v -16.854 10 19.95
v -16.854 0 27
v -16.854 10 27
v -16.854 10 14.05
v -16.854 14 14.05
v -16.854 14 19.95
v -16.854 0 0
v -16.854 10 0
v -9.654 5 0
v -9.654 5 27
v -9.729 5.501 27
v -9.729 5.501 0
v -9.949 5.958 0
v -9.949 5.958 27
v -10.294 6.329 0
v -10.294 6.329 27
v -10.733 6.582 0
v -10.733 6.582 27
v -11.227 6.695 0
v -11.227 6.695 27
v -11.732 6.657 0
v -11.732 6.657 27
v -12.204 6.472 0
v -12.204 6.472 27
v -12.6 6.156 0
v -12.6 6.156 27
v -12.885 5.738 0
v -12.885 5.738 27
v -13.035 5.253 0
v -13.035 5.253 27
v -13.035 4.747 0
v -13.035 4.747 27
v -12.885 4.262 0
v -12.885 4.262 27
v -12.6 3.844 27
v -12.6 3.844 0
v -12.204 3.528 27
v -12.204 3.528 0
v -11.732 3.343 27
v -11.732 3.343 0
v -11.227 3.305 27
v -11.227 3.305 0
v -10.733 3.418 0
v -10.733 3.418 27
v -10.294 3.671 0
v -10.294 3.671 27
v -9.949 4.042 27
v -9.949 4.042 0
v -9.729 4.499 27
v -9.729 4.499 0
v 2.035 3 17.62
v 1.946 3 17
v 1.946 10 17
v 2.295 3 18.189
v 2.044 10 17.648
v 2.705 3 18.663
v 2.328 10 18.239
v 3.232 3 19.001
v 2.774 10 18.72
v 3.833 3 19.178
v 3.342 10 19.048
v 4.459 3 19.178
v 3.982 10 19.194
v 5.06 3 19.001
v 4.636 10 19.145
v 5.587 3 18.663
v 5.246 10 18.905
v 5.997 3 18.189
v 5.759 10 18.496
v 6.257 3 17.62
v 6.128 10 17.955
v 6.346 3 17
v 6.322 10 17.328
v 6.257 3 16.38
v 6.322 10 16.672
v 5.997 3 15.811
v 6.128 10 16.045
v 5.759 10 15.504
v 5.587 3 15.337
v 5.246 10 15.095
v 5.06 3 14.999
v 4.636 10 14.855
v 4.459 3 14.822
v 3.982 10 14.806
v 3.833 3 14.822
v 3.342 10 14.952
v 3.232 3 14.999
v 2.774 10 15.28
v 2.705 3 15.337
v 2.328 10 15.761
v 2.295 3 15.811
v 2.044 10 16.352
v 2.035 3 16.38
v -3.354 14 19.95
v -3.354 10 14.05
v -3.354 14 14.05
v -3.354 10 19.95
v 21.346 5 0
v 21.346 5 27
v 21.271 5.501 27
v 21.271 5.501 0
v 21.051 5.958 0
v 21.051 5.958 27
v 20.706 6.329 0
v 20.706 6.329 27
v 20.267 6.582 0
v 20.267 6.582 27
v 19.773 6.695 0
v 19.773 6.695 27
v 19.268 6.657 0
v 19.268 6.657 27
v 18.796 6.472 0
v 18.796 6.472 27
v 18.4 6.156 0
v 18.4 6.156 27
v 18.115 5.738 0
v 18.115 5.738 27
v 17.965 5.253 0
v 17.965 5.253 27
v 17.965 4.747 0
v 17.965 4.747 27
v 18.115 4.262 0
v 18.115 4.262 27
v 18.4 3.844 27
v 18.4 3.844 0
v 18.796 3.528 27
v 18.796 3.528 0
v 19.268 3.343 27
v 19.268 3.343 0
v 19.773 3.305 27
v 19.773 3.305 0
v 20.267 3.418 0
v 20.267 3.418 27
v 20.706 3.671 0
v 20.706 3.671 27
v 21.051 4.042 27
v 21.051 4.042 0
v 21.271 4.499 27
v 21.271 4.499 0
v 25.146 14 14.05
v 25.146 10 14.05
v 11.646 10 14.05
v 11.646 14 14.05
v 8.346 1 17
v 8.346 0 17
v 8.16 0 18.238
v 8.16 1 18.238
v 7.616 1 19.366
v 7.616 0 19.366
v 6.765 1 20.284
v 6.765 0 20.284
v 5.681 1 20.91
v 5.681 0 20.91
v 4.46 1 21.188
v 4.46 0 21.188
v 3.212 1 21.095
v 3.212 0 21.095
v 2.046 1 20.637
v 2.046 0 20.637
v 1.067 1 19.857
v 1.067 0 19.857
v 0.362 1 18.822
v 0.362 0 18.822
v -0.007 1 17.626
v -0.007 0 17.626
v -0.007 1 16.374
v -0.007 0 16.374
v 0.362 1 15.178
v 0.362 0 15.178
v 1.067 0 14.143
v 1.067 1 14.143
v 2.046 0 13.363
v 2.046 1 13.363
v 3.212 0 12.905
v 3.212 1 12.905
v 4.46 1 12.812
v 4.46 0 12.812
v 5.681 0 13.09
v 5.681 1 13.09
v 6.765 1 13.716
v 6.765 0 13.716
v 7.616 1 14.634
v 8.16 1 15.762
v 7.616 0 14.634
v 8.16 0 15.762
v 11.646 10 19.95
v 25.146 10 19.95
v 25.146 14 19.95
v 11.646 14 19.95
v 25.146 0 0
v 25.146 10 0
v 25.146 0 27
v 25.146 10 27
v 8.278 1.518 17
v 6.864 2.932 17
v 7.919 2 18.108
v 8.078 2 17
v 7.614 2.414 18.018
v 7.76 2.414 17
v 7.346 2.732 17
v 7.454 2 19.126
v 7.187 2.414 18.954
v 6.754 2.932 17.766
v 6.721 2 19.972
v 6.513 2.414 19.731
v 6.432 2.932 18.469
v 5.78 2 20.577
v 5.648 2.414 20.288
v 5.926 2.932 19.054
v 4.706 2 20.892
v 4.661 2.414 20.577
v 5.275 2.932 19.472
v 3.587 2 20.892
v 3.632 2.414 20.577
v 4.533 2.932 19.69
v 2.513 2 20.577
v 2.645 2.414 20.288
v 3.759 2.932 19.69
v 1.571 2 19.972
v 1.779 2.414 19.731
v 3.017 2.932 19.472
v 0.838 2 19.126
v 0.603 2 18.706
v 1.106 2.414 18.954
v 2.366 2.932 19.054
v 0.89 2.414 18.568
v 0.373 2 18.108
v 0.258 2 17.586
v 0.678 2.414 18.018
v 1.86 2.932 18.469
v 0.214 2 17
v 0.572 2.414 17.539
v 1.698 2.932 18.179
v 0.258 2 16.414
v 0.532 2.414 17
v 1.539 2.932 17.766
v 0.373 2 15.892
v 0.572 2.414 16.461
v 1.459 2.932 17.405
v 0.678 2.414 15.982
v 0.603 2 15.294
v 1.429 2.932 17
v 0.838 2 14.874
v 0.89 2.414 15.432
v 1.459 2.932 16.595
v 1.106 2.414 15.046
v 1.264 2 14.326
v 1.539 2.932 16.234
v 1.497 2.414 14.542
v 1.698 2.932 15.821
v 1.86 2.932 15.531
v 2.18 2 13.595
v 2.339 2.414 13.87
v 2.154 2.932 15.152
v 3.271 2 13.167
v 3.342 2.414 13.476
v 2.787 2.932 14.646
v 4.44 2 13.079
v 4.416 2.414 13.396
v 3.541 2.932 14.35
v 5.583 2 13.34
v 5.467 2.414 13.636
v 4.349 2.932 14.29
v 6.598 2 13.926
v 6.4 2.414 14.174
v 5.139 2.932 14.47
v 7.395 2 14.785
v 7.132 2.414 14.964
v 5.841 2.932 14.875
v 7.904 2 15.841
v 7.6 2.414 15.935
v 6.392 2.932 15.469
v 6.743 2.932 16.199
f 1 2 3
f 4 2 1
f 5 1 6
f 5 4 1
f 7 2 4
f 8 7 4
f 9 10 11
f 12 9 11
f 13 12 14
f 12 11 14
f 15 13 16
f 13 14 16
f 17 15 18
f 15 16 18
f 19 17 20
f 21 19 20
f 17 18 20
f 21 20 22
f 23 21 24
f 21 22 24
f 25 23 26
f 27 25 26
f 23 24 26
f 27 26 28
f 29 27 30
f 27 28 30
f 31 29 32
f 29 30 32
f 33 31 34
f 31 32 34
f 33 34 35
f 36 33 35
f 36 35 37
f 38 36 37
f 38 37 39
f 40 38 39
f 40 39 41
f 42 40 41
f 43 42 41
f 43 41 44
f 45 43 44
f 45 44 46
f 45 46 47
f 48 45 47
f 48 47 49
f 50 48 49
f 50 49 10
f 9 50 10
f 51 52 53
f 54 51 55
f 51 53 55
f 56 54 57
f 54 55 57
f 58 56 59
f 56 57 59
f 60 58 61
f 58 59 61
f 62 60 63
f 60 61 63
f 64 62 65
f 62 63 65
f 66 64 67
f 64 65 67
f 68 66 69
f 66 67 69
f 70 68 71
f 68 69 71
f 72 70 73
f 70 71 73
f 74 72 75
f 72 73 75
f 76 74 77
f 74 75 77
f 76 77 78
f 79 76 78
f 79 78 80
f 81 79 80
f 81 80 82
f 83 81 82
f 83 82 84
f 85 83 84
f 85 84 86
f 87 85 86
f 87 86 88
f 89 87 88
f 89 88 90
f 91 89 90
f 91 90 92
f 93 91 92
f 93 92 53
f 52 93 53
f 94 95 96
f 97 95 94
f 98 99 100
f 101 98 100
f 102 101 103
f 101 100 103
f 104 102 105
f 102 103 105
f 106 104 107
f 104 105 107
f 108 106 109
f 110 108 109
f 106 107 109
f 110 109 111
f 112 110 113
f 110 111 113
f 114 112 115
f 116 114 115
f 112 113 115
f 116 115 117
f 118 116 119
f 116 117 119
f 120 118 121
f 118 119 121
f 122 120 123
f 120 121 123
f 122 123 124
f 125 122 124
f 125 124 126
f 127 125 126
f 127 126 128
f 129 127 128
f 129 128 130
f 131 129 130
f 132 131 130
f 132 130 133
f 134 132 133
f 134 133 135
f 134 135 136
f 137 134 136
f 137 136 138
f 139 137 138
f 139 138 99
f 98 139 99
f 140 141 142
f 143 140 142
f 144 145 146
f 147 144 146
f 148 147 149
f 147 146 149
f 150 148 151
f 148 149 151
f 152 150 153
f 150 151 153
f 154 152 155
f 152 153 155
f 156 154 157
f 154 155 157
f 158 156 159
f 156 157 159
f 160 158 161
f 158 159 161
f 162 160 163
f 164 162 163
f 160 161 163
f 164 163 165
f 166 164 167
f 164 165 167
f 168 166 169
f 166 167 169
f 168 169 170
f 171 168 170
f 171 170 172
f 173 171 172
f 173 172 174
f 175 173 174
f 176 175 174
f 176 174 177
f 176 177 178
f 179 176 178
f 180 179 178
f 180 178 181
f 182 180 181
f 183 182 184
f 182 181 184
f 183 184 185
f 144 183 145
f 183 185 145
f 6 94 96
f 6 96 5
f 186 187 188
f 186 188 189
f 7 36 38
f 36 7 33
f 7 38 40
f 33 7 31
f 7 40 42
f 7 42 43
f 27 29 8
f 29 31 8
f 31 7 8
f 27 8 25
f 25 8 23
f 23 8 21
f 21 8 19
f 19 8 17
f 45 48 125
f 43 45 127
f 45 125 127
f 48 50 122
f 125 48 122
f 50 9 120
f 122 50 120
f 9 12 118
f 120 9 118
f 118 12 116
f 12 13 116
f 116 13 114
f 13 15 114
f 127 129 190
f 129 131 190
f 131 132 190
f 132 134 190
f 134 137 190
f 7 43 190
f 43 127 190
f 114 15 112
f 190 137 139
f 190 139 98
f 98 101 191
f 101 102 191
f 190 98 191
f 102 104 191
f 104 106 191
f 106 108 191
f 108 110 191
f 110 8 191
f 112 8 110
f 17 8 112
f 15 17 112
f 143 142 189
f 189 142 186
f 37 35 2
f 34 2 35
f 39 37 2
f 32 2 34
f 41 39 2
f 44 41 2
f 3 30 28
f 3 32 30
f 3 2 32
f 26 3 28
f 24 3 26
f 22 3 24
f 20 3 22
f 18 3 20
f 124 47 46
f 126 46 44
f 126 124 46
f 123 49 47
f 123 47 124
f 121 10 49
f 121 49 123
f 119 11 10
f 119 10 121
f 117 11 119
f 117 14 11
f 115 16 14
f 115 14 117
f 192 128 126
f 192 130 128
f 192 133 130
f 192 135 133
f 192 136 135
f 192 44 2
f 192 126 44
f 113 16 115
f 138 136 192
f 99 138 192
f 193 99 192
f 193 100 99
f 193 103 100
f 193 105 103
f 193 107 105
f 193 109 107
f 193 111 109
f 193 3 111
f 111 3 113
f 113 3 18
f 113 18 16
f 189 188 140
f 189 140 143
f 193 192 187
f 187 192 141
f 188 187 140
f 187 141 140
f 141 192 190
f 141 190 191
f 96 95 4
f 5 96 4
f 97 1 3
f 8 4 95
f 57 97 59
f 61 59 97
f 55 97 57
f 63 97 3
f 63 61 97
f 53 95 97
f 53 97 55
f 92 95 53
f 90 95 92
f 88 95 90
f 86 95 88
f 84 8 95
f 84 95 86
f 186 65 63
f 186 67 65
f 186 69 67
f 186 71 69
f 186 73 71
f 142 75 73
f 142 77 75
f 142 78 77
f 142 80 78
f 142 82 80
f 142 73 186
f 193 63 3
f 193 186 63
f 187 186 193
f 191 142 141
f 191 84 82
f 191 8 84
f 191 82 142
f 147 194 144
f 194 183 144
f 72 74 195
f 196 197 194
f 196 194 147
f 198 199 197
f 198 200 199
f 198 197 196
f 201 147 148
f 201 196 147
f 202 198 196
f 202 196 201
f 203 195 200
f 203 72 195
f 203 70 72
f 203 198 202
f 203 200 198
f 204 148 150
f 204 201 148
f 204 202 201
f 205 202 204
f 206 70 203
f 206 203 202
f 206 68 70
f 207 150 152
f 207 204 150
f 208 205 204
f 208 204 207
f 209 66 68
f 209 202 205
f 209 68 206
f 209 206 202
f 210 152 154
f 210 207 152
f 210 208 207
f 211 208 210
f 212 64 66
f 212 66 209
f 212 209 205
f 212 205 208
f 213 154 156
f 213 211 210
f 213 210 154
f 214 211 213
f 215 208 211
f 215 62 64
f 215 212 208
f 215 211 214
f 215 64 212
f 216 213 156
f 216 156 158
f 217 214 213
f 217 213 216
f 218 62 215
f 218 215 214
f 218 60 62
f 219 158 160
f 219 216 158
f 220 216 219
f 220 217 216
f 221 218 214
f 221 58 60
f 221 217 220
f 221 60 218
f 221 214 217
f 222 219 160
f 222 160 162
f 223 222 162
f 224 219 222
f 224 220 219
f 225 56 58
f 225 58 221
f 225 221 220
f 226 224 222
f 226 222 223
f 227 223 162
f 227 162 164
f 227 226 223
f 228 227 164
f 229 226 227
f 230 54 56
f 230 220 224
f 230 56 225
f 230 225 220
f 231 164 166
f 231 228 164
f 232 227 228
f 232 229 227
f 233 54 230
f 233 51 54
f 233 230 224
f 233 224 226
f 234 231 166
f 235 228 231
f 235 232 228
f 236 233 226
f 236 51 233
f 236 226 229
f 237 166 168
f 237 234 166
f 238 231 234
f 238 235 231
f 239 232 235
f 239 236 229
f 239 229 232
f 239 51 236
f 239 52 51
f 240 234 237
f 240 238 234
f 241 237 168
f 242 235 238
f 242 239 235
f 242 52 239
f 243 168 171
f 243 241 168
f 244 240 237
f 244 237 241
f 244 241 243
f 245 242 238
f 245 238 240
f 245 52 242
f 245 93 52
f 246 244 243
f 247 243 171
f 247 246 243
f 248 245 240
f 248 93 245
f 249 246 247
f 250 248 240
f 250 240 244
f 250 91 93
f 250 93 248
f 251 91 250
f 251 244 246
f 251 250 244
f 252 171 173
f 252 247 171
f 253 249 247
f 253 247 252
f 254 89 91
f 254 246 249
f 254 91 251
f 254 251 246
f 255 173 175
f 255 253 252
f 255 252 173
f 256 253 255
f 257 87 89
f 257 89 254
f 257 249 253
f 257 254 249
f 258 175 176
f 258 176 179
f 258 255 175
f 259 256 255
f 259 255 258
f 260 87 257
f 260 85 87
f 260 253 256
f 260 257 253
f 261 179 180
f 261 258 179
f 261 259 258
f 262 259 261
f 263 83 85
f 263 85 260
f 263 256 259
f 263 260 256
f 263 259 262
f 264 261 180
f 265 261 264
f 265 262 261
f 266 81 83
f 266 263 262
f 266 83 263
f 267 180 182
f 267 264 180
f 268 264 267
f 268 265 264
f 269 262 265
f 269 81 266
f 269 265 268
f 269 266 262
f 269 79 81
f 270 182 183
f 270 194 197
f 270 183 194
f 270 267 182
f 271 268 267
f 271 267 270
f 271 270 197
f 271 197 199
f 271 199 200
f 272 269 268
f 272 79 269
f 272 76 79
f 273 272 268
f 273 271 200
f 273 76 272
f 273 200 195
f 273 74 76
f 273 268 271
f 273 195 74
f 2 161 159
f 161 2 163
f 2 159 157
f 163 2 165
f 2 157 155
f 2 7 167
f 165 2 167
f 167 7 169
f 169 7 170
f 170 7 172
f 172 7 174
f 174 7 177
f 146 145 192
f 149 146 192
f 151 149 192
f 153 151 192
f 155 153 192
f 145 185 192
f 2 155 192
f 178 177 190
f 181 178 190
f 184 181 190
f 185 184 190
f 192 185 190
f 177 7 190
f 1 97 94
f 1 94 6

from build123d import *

# Parameters (mm, degrees)
F0_W     = 42
F0_H     = 10
F1_DEPTH = 27
F2_R     = 1.7
F3_DEPTH = 27.001
F4_W     = 13.5
F4_H     = 5.9
F5_DEPTH = 4
F4_R     = 2.2
F6_DEPTH = 25
F7_R     = 4.2
F8_DEPTH = 3
F9_R     = 1.99999


# Not quite as in the source:
# - a fillet or chamfer is up to 0.001 mm smaller than in the source, because OpenCascade refuses the exact size


with BuildPart() as f1:
    # F0 (on Top) → F1 (new body)
    with BuildSketch(Plane.XY):
        with Locations((4.146153807, 5)):
            Rectangle(F0_W, F0_H)
    extrude(amount=F1_DEPTH)

    # F2 (on face) → F3 (cut, through all)
    with BuildSketch(Plane.XY.offset(27)):
        with BuildLine():
            ThreePointArc((-13.053846193, 5), (-11.353846193, 3.3), (-9.653846193, 5))
            ThreePointArc((-9.653846193, 5), (-11.353846193, 6.7), (-13.053846193, 5))
        make_face()
        with Locations((19.646153807, 5)):
            Circle(F2_R)
    extrude(amount=-F3_DEPTH, mode=Mode.SUBTRACT)

    # F4 (on face) → F5 (join)
    with BuildSketch(Plane(origin=(0, 10, 0), x_dir=(-1, 0, 0), z_dir=(0, 1, 0))):
        with Locations((-18.396153807, 17)):
            Rectangle(F4_W, F4_H)
        with Locations((10.103846193, 17)):
            Rectangle(F4_W, F4_H)
    extrude(amount=F5_DEPTH)

    # F4 (on face) → F6 (cut)
    with BuildSketch(Plane(origin=(0, 10, 0), x_dir=(-1, 0, 0), z_dir=(0, 1, 0))):
        with Locations((-4.146153807, 17)):
            Circle(F4_R)
    extrude(amount=-F6_DEPTH, mode=Mode.SUBTRACT)

    # F7 (on face) → F8 (cut)
    with BuildSketch(Plane.XZ):
        with Locations((4.146153807, 17)):
            Circle(F7_R)
    extrude(amount=-F8_DEPTH, mode=Mode.SUBTRACT)

    # F9 (radius 2 in the source; OpenCascade refuses exactly that, so slightly less here)
    f9_edges = [f1.edges().sort_by_distance(p)[0] for p in [
        (-0.053846, 3, 17),
    ]]
    fillet(f9_edges, radius=F9_R)


solid = f1.part
